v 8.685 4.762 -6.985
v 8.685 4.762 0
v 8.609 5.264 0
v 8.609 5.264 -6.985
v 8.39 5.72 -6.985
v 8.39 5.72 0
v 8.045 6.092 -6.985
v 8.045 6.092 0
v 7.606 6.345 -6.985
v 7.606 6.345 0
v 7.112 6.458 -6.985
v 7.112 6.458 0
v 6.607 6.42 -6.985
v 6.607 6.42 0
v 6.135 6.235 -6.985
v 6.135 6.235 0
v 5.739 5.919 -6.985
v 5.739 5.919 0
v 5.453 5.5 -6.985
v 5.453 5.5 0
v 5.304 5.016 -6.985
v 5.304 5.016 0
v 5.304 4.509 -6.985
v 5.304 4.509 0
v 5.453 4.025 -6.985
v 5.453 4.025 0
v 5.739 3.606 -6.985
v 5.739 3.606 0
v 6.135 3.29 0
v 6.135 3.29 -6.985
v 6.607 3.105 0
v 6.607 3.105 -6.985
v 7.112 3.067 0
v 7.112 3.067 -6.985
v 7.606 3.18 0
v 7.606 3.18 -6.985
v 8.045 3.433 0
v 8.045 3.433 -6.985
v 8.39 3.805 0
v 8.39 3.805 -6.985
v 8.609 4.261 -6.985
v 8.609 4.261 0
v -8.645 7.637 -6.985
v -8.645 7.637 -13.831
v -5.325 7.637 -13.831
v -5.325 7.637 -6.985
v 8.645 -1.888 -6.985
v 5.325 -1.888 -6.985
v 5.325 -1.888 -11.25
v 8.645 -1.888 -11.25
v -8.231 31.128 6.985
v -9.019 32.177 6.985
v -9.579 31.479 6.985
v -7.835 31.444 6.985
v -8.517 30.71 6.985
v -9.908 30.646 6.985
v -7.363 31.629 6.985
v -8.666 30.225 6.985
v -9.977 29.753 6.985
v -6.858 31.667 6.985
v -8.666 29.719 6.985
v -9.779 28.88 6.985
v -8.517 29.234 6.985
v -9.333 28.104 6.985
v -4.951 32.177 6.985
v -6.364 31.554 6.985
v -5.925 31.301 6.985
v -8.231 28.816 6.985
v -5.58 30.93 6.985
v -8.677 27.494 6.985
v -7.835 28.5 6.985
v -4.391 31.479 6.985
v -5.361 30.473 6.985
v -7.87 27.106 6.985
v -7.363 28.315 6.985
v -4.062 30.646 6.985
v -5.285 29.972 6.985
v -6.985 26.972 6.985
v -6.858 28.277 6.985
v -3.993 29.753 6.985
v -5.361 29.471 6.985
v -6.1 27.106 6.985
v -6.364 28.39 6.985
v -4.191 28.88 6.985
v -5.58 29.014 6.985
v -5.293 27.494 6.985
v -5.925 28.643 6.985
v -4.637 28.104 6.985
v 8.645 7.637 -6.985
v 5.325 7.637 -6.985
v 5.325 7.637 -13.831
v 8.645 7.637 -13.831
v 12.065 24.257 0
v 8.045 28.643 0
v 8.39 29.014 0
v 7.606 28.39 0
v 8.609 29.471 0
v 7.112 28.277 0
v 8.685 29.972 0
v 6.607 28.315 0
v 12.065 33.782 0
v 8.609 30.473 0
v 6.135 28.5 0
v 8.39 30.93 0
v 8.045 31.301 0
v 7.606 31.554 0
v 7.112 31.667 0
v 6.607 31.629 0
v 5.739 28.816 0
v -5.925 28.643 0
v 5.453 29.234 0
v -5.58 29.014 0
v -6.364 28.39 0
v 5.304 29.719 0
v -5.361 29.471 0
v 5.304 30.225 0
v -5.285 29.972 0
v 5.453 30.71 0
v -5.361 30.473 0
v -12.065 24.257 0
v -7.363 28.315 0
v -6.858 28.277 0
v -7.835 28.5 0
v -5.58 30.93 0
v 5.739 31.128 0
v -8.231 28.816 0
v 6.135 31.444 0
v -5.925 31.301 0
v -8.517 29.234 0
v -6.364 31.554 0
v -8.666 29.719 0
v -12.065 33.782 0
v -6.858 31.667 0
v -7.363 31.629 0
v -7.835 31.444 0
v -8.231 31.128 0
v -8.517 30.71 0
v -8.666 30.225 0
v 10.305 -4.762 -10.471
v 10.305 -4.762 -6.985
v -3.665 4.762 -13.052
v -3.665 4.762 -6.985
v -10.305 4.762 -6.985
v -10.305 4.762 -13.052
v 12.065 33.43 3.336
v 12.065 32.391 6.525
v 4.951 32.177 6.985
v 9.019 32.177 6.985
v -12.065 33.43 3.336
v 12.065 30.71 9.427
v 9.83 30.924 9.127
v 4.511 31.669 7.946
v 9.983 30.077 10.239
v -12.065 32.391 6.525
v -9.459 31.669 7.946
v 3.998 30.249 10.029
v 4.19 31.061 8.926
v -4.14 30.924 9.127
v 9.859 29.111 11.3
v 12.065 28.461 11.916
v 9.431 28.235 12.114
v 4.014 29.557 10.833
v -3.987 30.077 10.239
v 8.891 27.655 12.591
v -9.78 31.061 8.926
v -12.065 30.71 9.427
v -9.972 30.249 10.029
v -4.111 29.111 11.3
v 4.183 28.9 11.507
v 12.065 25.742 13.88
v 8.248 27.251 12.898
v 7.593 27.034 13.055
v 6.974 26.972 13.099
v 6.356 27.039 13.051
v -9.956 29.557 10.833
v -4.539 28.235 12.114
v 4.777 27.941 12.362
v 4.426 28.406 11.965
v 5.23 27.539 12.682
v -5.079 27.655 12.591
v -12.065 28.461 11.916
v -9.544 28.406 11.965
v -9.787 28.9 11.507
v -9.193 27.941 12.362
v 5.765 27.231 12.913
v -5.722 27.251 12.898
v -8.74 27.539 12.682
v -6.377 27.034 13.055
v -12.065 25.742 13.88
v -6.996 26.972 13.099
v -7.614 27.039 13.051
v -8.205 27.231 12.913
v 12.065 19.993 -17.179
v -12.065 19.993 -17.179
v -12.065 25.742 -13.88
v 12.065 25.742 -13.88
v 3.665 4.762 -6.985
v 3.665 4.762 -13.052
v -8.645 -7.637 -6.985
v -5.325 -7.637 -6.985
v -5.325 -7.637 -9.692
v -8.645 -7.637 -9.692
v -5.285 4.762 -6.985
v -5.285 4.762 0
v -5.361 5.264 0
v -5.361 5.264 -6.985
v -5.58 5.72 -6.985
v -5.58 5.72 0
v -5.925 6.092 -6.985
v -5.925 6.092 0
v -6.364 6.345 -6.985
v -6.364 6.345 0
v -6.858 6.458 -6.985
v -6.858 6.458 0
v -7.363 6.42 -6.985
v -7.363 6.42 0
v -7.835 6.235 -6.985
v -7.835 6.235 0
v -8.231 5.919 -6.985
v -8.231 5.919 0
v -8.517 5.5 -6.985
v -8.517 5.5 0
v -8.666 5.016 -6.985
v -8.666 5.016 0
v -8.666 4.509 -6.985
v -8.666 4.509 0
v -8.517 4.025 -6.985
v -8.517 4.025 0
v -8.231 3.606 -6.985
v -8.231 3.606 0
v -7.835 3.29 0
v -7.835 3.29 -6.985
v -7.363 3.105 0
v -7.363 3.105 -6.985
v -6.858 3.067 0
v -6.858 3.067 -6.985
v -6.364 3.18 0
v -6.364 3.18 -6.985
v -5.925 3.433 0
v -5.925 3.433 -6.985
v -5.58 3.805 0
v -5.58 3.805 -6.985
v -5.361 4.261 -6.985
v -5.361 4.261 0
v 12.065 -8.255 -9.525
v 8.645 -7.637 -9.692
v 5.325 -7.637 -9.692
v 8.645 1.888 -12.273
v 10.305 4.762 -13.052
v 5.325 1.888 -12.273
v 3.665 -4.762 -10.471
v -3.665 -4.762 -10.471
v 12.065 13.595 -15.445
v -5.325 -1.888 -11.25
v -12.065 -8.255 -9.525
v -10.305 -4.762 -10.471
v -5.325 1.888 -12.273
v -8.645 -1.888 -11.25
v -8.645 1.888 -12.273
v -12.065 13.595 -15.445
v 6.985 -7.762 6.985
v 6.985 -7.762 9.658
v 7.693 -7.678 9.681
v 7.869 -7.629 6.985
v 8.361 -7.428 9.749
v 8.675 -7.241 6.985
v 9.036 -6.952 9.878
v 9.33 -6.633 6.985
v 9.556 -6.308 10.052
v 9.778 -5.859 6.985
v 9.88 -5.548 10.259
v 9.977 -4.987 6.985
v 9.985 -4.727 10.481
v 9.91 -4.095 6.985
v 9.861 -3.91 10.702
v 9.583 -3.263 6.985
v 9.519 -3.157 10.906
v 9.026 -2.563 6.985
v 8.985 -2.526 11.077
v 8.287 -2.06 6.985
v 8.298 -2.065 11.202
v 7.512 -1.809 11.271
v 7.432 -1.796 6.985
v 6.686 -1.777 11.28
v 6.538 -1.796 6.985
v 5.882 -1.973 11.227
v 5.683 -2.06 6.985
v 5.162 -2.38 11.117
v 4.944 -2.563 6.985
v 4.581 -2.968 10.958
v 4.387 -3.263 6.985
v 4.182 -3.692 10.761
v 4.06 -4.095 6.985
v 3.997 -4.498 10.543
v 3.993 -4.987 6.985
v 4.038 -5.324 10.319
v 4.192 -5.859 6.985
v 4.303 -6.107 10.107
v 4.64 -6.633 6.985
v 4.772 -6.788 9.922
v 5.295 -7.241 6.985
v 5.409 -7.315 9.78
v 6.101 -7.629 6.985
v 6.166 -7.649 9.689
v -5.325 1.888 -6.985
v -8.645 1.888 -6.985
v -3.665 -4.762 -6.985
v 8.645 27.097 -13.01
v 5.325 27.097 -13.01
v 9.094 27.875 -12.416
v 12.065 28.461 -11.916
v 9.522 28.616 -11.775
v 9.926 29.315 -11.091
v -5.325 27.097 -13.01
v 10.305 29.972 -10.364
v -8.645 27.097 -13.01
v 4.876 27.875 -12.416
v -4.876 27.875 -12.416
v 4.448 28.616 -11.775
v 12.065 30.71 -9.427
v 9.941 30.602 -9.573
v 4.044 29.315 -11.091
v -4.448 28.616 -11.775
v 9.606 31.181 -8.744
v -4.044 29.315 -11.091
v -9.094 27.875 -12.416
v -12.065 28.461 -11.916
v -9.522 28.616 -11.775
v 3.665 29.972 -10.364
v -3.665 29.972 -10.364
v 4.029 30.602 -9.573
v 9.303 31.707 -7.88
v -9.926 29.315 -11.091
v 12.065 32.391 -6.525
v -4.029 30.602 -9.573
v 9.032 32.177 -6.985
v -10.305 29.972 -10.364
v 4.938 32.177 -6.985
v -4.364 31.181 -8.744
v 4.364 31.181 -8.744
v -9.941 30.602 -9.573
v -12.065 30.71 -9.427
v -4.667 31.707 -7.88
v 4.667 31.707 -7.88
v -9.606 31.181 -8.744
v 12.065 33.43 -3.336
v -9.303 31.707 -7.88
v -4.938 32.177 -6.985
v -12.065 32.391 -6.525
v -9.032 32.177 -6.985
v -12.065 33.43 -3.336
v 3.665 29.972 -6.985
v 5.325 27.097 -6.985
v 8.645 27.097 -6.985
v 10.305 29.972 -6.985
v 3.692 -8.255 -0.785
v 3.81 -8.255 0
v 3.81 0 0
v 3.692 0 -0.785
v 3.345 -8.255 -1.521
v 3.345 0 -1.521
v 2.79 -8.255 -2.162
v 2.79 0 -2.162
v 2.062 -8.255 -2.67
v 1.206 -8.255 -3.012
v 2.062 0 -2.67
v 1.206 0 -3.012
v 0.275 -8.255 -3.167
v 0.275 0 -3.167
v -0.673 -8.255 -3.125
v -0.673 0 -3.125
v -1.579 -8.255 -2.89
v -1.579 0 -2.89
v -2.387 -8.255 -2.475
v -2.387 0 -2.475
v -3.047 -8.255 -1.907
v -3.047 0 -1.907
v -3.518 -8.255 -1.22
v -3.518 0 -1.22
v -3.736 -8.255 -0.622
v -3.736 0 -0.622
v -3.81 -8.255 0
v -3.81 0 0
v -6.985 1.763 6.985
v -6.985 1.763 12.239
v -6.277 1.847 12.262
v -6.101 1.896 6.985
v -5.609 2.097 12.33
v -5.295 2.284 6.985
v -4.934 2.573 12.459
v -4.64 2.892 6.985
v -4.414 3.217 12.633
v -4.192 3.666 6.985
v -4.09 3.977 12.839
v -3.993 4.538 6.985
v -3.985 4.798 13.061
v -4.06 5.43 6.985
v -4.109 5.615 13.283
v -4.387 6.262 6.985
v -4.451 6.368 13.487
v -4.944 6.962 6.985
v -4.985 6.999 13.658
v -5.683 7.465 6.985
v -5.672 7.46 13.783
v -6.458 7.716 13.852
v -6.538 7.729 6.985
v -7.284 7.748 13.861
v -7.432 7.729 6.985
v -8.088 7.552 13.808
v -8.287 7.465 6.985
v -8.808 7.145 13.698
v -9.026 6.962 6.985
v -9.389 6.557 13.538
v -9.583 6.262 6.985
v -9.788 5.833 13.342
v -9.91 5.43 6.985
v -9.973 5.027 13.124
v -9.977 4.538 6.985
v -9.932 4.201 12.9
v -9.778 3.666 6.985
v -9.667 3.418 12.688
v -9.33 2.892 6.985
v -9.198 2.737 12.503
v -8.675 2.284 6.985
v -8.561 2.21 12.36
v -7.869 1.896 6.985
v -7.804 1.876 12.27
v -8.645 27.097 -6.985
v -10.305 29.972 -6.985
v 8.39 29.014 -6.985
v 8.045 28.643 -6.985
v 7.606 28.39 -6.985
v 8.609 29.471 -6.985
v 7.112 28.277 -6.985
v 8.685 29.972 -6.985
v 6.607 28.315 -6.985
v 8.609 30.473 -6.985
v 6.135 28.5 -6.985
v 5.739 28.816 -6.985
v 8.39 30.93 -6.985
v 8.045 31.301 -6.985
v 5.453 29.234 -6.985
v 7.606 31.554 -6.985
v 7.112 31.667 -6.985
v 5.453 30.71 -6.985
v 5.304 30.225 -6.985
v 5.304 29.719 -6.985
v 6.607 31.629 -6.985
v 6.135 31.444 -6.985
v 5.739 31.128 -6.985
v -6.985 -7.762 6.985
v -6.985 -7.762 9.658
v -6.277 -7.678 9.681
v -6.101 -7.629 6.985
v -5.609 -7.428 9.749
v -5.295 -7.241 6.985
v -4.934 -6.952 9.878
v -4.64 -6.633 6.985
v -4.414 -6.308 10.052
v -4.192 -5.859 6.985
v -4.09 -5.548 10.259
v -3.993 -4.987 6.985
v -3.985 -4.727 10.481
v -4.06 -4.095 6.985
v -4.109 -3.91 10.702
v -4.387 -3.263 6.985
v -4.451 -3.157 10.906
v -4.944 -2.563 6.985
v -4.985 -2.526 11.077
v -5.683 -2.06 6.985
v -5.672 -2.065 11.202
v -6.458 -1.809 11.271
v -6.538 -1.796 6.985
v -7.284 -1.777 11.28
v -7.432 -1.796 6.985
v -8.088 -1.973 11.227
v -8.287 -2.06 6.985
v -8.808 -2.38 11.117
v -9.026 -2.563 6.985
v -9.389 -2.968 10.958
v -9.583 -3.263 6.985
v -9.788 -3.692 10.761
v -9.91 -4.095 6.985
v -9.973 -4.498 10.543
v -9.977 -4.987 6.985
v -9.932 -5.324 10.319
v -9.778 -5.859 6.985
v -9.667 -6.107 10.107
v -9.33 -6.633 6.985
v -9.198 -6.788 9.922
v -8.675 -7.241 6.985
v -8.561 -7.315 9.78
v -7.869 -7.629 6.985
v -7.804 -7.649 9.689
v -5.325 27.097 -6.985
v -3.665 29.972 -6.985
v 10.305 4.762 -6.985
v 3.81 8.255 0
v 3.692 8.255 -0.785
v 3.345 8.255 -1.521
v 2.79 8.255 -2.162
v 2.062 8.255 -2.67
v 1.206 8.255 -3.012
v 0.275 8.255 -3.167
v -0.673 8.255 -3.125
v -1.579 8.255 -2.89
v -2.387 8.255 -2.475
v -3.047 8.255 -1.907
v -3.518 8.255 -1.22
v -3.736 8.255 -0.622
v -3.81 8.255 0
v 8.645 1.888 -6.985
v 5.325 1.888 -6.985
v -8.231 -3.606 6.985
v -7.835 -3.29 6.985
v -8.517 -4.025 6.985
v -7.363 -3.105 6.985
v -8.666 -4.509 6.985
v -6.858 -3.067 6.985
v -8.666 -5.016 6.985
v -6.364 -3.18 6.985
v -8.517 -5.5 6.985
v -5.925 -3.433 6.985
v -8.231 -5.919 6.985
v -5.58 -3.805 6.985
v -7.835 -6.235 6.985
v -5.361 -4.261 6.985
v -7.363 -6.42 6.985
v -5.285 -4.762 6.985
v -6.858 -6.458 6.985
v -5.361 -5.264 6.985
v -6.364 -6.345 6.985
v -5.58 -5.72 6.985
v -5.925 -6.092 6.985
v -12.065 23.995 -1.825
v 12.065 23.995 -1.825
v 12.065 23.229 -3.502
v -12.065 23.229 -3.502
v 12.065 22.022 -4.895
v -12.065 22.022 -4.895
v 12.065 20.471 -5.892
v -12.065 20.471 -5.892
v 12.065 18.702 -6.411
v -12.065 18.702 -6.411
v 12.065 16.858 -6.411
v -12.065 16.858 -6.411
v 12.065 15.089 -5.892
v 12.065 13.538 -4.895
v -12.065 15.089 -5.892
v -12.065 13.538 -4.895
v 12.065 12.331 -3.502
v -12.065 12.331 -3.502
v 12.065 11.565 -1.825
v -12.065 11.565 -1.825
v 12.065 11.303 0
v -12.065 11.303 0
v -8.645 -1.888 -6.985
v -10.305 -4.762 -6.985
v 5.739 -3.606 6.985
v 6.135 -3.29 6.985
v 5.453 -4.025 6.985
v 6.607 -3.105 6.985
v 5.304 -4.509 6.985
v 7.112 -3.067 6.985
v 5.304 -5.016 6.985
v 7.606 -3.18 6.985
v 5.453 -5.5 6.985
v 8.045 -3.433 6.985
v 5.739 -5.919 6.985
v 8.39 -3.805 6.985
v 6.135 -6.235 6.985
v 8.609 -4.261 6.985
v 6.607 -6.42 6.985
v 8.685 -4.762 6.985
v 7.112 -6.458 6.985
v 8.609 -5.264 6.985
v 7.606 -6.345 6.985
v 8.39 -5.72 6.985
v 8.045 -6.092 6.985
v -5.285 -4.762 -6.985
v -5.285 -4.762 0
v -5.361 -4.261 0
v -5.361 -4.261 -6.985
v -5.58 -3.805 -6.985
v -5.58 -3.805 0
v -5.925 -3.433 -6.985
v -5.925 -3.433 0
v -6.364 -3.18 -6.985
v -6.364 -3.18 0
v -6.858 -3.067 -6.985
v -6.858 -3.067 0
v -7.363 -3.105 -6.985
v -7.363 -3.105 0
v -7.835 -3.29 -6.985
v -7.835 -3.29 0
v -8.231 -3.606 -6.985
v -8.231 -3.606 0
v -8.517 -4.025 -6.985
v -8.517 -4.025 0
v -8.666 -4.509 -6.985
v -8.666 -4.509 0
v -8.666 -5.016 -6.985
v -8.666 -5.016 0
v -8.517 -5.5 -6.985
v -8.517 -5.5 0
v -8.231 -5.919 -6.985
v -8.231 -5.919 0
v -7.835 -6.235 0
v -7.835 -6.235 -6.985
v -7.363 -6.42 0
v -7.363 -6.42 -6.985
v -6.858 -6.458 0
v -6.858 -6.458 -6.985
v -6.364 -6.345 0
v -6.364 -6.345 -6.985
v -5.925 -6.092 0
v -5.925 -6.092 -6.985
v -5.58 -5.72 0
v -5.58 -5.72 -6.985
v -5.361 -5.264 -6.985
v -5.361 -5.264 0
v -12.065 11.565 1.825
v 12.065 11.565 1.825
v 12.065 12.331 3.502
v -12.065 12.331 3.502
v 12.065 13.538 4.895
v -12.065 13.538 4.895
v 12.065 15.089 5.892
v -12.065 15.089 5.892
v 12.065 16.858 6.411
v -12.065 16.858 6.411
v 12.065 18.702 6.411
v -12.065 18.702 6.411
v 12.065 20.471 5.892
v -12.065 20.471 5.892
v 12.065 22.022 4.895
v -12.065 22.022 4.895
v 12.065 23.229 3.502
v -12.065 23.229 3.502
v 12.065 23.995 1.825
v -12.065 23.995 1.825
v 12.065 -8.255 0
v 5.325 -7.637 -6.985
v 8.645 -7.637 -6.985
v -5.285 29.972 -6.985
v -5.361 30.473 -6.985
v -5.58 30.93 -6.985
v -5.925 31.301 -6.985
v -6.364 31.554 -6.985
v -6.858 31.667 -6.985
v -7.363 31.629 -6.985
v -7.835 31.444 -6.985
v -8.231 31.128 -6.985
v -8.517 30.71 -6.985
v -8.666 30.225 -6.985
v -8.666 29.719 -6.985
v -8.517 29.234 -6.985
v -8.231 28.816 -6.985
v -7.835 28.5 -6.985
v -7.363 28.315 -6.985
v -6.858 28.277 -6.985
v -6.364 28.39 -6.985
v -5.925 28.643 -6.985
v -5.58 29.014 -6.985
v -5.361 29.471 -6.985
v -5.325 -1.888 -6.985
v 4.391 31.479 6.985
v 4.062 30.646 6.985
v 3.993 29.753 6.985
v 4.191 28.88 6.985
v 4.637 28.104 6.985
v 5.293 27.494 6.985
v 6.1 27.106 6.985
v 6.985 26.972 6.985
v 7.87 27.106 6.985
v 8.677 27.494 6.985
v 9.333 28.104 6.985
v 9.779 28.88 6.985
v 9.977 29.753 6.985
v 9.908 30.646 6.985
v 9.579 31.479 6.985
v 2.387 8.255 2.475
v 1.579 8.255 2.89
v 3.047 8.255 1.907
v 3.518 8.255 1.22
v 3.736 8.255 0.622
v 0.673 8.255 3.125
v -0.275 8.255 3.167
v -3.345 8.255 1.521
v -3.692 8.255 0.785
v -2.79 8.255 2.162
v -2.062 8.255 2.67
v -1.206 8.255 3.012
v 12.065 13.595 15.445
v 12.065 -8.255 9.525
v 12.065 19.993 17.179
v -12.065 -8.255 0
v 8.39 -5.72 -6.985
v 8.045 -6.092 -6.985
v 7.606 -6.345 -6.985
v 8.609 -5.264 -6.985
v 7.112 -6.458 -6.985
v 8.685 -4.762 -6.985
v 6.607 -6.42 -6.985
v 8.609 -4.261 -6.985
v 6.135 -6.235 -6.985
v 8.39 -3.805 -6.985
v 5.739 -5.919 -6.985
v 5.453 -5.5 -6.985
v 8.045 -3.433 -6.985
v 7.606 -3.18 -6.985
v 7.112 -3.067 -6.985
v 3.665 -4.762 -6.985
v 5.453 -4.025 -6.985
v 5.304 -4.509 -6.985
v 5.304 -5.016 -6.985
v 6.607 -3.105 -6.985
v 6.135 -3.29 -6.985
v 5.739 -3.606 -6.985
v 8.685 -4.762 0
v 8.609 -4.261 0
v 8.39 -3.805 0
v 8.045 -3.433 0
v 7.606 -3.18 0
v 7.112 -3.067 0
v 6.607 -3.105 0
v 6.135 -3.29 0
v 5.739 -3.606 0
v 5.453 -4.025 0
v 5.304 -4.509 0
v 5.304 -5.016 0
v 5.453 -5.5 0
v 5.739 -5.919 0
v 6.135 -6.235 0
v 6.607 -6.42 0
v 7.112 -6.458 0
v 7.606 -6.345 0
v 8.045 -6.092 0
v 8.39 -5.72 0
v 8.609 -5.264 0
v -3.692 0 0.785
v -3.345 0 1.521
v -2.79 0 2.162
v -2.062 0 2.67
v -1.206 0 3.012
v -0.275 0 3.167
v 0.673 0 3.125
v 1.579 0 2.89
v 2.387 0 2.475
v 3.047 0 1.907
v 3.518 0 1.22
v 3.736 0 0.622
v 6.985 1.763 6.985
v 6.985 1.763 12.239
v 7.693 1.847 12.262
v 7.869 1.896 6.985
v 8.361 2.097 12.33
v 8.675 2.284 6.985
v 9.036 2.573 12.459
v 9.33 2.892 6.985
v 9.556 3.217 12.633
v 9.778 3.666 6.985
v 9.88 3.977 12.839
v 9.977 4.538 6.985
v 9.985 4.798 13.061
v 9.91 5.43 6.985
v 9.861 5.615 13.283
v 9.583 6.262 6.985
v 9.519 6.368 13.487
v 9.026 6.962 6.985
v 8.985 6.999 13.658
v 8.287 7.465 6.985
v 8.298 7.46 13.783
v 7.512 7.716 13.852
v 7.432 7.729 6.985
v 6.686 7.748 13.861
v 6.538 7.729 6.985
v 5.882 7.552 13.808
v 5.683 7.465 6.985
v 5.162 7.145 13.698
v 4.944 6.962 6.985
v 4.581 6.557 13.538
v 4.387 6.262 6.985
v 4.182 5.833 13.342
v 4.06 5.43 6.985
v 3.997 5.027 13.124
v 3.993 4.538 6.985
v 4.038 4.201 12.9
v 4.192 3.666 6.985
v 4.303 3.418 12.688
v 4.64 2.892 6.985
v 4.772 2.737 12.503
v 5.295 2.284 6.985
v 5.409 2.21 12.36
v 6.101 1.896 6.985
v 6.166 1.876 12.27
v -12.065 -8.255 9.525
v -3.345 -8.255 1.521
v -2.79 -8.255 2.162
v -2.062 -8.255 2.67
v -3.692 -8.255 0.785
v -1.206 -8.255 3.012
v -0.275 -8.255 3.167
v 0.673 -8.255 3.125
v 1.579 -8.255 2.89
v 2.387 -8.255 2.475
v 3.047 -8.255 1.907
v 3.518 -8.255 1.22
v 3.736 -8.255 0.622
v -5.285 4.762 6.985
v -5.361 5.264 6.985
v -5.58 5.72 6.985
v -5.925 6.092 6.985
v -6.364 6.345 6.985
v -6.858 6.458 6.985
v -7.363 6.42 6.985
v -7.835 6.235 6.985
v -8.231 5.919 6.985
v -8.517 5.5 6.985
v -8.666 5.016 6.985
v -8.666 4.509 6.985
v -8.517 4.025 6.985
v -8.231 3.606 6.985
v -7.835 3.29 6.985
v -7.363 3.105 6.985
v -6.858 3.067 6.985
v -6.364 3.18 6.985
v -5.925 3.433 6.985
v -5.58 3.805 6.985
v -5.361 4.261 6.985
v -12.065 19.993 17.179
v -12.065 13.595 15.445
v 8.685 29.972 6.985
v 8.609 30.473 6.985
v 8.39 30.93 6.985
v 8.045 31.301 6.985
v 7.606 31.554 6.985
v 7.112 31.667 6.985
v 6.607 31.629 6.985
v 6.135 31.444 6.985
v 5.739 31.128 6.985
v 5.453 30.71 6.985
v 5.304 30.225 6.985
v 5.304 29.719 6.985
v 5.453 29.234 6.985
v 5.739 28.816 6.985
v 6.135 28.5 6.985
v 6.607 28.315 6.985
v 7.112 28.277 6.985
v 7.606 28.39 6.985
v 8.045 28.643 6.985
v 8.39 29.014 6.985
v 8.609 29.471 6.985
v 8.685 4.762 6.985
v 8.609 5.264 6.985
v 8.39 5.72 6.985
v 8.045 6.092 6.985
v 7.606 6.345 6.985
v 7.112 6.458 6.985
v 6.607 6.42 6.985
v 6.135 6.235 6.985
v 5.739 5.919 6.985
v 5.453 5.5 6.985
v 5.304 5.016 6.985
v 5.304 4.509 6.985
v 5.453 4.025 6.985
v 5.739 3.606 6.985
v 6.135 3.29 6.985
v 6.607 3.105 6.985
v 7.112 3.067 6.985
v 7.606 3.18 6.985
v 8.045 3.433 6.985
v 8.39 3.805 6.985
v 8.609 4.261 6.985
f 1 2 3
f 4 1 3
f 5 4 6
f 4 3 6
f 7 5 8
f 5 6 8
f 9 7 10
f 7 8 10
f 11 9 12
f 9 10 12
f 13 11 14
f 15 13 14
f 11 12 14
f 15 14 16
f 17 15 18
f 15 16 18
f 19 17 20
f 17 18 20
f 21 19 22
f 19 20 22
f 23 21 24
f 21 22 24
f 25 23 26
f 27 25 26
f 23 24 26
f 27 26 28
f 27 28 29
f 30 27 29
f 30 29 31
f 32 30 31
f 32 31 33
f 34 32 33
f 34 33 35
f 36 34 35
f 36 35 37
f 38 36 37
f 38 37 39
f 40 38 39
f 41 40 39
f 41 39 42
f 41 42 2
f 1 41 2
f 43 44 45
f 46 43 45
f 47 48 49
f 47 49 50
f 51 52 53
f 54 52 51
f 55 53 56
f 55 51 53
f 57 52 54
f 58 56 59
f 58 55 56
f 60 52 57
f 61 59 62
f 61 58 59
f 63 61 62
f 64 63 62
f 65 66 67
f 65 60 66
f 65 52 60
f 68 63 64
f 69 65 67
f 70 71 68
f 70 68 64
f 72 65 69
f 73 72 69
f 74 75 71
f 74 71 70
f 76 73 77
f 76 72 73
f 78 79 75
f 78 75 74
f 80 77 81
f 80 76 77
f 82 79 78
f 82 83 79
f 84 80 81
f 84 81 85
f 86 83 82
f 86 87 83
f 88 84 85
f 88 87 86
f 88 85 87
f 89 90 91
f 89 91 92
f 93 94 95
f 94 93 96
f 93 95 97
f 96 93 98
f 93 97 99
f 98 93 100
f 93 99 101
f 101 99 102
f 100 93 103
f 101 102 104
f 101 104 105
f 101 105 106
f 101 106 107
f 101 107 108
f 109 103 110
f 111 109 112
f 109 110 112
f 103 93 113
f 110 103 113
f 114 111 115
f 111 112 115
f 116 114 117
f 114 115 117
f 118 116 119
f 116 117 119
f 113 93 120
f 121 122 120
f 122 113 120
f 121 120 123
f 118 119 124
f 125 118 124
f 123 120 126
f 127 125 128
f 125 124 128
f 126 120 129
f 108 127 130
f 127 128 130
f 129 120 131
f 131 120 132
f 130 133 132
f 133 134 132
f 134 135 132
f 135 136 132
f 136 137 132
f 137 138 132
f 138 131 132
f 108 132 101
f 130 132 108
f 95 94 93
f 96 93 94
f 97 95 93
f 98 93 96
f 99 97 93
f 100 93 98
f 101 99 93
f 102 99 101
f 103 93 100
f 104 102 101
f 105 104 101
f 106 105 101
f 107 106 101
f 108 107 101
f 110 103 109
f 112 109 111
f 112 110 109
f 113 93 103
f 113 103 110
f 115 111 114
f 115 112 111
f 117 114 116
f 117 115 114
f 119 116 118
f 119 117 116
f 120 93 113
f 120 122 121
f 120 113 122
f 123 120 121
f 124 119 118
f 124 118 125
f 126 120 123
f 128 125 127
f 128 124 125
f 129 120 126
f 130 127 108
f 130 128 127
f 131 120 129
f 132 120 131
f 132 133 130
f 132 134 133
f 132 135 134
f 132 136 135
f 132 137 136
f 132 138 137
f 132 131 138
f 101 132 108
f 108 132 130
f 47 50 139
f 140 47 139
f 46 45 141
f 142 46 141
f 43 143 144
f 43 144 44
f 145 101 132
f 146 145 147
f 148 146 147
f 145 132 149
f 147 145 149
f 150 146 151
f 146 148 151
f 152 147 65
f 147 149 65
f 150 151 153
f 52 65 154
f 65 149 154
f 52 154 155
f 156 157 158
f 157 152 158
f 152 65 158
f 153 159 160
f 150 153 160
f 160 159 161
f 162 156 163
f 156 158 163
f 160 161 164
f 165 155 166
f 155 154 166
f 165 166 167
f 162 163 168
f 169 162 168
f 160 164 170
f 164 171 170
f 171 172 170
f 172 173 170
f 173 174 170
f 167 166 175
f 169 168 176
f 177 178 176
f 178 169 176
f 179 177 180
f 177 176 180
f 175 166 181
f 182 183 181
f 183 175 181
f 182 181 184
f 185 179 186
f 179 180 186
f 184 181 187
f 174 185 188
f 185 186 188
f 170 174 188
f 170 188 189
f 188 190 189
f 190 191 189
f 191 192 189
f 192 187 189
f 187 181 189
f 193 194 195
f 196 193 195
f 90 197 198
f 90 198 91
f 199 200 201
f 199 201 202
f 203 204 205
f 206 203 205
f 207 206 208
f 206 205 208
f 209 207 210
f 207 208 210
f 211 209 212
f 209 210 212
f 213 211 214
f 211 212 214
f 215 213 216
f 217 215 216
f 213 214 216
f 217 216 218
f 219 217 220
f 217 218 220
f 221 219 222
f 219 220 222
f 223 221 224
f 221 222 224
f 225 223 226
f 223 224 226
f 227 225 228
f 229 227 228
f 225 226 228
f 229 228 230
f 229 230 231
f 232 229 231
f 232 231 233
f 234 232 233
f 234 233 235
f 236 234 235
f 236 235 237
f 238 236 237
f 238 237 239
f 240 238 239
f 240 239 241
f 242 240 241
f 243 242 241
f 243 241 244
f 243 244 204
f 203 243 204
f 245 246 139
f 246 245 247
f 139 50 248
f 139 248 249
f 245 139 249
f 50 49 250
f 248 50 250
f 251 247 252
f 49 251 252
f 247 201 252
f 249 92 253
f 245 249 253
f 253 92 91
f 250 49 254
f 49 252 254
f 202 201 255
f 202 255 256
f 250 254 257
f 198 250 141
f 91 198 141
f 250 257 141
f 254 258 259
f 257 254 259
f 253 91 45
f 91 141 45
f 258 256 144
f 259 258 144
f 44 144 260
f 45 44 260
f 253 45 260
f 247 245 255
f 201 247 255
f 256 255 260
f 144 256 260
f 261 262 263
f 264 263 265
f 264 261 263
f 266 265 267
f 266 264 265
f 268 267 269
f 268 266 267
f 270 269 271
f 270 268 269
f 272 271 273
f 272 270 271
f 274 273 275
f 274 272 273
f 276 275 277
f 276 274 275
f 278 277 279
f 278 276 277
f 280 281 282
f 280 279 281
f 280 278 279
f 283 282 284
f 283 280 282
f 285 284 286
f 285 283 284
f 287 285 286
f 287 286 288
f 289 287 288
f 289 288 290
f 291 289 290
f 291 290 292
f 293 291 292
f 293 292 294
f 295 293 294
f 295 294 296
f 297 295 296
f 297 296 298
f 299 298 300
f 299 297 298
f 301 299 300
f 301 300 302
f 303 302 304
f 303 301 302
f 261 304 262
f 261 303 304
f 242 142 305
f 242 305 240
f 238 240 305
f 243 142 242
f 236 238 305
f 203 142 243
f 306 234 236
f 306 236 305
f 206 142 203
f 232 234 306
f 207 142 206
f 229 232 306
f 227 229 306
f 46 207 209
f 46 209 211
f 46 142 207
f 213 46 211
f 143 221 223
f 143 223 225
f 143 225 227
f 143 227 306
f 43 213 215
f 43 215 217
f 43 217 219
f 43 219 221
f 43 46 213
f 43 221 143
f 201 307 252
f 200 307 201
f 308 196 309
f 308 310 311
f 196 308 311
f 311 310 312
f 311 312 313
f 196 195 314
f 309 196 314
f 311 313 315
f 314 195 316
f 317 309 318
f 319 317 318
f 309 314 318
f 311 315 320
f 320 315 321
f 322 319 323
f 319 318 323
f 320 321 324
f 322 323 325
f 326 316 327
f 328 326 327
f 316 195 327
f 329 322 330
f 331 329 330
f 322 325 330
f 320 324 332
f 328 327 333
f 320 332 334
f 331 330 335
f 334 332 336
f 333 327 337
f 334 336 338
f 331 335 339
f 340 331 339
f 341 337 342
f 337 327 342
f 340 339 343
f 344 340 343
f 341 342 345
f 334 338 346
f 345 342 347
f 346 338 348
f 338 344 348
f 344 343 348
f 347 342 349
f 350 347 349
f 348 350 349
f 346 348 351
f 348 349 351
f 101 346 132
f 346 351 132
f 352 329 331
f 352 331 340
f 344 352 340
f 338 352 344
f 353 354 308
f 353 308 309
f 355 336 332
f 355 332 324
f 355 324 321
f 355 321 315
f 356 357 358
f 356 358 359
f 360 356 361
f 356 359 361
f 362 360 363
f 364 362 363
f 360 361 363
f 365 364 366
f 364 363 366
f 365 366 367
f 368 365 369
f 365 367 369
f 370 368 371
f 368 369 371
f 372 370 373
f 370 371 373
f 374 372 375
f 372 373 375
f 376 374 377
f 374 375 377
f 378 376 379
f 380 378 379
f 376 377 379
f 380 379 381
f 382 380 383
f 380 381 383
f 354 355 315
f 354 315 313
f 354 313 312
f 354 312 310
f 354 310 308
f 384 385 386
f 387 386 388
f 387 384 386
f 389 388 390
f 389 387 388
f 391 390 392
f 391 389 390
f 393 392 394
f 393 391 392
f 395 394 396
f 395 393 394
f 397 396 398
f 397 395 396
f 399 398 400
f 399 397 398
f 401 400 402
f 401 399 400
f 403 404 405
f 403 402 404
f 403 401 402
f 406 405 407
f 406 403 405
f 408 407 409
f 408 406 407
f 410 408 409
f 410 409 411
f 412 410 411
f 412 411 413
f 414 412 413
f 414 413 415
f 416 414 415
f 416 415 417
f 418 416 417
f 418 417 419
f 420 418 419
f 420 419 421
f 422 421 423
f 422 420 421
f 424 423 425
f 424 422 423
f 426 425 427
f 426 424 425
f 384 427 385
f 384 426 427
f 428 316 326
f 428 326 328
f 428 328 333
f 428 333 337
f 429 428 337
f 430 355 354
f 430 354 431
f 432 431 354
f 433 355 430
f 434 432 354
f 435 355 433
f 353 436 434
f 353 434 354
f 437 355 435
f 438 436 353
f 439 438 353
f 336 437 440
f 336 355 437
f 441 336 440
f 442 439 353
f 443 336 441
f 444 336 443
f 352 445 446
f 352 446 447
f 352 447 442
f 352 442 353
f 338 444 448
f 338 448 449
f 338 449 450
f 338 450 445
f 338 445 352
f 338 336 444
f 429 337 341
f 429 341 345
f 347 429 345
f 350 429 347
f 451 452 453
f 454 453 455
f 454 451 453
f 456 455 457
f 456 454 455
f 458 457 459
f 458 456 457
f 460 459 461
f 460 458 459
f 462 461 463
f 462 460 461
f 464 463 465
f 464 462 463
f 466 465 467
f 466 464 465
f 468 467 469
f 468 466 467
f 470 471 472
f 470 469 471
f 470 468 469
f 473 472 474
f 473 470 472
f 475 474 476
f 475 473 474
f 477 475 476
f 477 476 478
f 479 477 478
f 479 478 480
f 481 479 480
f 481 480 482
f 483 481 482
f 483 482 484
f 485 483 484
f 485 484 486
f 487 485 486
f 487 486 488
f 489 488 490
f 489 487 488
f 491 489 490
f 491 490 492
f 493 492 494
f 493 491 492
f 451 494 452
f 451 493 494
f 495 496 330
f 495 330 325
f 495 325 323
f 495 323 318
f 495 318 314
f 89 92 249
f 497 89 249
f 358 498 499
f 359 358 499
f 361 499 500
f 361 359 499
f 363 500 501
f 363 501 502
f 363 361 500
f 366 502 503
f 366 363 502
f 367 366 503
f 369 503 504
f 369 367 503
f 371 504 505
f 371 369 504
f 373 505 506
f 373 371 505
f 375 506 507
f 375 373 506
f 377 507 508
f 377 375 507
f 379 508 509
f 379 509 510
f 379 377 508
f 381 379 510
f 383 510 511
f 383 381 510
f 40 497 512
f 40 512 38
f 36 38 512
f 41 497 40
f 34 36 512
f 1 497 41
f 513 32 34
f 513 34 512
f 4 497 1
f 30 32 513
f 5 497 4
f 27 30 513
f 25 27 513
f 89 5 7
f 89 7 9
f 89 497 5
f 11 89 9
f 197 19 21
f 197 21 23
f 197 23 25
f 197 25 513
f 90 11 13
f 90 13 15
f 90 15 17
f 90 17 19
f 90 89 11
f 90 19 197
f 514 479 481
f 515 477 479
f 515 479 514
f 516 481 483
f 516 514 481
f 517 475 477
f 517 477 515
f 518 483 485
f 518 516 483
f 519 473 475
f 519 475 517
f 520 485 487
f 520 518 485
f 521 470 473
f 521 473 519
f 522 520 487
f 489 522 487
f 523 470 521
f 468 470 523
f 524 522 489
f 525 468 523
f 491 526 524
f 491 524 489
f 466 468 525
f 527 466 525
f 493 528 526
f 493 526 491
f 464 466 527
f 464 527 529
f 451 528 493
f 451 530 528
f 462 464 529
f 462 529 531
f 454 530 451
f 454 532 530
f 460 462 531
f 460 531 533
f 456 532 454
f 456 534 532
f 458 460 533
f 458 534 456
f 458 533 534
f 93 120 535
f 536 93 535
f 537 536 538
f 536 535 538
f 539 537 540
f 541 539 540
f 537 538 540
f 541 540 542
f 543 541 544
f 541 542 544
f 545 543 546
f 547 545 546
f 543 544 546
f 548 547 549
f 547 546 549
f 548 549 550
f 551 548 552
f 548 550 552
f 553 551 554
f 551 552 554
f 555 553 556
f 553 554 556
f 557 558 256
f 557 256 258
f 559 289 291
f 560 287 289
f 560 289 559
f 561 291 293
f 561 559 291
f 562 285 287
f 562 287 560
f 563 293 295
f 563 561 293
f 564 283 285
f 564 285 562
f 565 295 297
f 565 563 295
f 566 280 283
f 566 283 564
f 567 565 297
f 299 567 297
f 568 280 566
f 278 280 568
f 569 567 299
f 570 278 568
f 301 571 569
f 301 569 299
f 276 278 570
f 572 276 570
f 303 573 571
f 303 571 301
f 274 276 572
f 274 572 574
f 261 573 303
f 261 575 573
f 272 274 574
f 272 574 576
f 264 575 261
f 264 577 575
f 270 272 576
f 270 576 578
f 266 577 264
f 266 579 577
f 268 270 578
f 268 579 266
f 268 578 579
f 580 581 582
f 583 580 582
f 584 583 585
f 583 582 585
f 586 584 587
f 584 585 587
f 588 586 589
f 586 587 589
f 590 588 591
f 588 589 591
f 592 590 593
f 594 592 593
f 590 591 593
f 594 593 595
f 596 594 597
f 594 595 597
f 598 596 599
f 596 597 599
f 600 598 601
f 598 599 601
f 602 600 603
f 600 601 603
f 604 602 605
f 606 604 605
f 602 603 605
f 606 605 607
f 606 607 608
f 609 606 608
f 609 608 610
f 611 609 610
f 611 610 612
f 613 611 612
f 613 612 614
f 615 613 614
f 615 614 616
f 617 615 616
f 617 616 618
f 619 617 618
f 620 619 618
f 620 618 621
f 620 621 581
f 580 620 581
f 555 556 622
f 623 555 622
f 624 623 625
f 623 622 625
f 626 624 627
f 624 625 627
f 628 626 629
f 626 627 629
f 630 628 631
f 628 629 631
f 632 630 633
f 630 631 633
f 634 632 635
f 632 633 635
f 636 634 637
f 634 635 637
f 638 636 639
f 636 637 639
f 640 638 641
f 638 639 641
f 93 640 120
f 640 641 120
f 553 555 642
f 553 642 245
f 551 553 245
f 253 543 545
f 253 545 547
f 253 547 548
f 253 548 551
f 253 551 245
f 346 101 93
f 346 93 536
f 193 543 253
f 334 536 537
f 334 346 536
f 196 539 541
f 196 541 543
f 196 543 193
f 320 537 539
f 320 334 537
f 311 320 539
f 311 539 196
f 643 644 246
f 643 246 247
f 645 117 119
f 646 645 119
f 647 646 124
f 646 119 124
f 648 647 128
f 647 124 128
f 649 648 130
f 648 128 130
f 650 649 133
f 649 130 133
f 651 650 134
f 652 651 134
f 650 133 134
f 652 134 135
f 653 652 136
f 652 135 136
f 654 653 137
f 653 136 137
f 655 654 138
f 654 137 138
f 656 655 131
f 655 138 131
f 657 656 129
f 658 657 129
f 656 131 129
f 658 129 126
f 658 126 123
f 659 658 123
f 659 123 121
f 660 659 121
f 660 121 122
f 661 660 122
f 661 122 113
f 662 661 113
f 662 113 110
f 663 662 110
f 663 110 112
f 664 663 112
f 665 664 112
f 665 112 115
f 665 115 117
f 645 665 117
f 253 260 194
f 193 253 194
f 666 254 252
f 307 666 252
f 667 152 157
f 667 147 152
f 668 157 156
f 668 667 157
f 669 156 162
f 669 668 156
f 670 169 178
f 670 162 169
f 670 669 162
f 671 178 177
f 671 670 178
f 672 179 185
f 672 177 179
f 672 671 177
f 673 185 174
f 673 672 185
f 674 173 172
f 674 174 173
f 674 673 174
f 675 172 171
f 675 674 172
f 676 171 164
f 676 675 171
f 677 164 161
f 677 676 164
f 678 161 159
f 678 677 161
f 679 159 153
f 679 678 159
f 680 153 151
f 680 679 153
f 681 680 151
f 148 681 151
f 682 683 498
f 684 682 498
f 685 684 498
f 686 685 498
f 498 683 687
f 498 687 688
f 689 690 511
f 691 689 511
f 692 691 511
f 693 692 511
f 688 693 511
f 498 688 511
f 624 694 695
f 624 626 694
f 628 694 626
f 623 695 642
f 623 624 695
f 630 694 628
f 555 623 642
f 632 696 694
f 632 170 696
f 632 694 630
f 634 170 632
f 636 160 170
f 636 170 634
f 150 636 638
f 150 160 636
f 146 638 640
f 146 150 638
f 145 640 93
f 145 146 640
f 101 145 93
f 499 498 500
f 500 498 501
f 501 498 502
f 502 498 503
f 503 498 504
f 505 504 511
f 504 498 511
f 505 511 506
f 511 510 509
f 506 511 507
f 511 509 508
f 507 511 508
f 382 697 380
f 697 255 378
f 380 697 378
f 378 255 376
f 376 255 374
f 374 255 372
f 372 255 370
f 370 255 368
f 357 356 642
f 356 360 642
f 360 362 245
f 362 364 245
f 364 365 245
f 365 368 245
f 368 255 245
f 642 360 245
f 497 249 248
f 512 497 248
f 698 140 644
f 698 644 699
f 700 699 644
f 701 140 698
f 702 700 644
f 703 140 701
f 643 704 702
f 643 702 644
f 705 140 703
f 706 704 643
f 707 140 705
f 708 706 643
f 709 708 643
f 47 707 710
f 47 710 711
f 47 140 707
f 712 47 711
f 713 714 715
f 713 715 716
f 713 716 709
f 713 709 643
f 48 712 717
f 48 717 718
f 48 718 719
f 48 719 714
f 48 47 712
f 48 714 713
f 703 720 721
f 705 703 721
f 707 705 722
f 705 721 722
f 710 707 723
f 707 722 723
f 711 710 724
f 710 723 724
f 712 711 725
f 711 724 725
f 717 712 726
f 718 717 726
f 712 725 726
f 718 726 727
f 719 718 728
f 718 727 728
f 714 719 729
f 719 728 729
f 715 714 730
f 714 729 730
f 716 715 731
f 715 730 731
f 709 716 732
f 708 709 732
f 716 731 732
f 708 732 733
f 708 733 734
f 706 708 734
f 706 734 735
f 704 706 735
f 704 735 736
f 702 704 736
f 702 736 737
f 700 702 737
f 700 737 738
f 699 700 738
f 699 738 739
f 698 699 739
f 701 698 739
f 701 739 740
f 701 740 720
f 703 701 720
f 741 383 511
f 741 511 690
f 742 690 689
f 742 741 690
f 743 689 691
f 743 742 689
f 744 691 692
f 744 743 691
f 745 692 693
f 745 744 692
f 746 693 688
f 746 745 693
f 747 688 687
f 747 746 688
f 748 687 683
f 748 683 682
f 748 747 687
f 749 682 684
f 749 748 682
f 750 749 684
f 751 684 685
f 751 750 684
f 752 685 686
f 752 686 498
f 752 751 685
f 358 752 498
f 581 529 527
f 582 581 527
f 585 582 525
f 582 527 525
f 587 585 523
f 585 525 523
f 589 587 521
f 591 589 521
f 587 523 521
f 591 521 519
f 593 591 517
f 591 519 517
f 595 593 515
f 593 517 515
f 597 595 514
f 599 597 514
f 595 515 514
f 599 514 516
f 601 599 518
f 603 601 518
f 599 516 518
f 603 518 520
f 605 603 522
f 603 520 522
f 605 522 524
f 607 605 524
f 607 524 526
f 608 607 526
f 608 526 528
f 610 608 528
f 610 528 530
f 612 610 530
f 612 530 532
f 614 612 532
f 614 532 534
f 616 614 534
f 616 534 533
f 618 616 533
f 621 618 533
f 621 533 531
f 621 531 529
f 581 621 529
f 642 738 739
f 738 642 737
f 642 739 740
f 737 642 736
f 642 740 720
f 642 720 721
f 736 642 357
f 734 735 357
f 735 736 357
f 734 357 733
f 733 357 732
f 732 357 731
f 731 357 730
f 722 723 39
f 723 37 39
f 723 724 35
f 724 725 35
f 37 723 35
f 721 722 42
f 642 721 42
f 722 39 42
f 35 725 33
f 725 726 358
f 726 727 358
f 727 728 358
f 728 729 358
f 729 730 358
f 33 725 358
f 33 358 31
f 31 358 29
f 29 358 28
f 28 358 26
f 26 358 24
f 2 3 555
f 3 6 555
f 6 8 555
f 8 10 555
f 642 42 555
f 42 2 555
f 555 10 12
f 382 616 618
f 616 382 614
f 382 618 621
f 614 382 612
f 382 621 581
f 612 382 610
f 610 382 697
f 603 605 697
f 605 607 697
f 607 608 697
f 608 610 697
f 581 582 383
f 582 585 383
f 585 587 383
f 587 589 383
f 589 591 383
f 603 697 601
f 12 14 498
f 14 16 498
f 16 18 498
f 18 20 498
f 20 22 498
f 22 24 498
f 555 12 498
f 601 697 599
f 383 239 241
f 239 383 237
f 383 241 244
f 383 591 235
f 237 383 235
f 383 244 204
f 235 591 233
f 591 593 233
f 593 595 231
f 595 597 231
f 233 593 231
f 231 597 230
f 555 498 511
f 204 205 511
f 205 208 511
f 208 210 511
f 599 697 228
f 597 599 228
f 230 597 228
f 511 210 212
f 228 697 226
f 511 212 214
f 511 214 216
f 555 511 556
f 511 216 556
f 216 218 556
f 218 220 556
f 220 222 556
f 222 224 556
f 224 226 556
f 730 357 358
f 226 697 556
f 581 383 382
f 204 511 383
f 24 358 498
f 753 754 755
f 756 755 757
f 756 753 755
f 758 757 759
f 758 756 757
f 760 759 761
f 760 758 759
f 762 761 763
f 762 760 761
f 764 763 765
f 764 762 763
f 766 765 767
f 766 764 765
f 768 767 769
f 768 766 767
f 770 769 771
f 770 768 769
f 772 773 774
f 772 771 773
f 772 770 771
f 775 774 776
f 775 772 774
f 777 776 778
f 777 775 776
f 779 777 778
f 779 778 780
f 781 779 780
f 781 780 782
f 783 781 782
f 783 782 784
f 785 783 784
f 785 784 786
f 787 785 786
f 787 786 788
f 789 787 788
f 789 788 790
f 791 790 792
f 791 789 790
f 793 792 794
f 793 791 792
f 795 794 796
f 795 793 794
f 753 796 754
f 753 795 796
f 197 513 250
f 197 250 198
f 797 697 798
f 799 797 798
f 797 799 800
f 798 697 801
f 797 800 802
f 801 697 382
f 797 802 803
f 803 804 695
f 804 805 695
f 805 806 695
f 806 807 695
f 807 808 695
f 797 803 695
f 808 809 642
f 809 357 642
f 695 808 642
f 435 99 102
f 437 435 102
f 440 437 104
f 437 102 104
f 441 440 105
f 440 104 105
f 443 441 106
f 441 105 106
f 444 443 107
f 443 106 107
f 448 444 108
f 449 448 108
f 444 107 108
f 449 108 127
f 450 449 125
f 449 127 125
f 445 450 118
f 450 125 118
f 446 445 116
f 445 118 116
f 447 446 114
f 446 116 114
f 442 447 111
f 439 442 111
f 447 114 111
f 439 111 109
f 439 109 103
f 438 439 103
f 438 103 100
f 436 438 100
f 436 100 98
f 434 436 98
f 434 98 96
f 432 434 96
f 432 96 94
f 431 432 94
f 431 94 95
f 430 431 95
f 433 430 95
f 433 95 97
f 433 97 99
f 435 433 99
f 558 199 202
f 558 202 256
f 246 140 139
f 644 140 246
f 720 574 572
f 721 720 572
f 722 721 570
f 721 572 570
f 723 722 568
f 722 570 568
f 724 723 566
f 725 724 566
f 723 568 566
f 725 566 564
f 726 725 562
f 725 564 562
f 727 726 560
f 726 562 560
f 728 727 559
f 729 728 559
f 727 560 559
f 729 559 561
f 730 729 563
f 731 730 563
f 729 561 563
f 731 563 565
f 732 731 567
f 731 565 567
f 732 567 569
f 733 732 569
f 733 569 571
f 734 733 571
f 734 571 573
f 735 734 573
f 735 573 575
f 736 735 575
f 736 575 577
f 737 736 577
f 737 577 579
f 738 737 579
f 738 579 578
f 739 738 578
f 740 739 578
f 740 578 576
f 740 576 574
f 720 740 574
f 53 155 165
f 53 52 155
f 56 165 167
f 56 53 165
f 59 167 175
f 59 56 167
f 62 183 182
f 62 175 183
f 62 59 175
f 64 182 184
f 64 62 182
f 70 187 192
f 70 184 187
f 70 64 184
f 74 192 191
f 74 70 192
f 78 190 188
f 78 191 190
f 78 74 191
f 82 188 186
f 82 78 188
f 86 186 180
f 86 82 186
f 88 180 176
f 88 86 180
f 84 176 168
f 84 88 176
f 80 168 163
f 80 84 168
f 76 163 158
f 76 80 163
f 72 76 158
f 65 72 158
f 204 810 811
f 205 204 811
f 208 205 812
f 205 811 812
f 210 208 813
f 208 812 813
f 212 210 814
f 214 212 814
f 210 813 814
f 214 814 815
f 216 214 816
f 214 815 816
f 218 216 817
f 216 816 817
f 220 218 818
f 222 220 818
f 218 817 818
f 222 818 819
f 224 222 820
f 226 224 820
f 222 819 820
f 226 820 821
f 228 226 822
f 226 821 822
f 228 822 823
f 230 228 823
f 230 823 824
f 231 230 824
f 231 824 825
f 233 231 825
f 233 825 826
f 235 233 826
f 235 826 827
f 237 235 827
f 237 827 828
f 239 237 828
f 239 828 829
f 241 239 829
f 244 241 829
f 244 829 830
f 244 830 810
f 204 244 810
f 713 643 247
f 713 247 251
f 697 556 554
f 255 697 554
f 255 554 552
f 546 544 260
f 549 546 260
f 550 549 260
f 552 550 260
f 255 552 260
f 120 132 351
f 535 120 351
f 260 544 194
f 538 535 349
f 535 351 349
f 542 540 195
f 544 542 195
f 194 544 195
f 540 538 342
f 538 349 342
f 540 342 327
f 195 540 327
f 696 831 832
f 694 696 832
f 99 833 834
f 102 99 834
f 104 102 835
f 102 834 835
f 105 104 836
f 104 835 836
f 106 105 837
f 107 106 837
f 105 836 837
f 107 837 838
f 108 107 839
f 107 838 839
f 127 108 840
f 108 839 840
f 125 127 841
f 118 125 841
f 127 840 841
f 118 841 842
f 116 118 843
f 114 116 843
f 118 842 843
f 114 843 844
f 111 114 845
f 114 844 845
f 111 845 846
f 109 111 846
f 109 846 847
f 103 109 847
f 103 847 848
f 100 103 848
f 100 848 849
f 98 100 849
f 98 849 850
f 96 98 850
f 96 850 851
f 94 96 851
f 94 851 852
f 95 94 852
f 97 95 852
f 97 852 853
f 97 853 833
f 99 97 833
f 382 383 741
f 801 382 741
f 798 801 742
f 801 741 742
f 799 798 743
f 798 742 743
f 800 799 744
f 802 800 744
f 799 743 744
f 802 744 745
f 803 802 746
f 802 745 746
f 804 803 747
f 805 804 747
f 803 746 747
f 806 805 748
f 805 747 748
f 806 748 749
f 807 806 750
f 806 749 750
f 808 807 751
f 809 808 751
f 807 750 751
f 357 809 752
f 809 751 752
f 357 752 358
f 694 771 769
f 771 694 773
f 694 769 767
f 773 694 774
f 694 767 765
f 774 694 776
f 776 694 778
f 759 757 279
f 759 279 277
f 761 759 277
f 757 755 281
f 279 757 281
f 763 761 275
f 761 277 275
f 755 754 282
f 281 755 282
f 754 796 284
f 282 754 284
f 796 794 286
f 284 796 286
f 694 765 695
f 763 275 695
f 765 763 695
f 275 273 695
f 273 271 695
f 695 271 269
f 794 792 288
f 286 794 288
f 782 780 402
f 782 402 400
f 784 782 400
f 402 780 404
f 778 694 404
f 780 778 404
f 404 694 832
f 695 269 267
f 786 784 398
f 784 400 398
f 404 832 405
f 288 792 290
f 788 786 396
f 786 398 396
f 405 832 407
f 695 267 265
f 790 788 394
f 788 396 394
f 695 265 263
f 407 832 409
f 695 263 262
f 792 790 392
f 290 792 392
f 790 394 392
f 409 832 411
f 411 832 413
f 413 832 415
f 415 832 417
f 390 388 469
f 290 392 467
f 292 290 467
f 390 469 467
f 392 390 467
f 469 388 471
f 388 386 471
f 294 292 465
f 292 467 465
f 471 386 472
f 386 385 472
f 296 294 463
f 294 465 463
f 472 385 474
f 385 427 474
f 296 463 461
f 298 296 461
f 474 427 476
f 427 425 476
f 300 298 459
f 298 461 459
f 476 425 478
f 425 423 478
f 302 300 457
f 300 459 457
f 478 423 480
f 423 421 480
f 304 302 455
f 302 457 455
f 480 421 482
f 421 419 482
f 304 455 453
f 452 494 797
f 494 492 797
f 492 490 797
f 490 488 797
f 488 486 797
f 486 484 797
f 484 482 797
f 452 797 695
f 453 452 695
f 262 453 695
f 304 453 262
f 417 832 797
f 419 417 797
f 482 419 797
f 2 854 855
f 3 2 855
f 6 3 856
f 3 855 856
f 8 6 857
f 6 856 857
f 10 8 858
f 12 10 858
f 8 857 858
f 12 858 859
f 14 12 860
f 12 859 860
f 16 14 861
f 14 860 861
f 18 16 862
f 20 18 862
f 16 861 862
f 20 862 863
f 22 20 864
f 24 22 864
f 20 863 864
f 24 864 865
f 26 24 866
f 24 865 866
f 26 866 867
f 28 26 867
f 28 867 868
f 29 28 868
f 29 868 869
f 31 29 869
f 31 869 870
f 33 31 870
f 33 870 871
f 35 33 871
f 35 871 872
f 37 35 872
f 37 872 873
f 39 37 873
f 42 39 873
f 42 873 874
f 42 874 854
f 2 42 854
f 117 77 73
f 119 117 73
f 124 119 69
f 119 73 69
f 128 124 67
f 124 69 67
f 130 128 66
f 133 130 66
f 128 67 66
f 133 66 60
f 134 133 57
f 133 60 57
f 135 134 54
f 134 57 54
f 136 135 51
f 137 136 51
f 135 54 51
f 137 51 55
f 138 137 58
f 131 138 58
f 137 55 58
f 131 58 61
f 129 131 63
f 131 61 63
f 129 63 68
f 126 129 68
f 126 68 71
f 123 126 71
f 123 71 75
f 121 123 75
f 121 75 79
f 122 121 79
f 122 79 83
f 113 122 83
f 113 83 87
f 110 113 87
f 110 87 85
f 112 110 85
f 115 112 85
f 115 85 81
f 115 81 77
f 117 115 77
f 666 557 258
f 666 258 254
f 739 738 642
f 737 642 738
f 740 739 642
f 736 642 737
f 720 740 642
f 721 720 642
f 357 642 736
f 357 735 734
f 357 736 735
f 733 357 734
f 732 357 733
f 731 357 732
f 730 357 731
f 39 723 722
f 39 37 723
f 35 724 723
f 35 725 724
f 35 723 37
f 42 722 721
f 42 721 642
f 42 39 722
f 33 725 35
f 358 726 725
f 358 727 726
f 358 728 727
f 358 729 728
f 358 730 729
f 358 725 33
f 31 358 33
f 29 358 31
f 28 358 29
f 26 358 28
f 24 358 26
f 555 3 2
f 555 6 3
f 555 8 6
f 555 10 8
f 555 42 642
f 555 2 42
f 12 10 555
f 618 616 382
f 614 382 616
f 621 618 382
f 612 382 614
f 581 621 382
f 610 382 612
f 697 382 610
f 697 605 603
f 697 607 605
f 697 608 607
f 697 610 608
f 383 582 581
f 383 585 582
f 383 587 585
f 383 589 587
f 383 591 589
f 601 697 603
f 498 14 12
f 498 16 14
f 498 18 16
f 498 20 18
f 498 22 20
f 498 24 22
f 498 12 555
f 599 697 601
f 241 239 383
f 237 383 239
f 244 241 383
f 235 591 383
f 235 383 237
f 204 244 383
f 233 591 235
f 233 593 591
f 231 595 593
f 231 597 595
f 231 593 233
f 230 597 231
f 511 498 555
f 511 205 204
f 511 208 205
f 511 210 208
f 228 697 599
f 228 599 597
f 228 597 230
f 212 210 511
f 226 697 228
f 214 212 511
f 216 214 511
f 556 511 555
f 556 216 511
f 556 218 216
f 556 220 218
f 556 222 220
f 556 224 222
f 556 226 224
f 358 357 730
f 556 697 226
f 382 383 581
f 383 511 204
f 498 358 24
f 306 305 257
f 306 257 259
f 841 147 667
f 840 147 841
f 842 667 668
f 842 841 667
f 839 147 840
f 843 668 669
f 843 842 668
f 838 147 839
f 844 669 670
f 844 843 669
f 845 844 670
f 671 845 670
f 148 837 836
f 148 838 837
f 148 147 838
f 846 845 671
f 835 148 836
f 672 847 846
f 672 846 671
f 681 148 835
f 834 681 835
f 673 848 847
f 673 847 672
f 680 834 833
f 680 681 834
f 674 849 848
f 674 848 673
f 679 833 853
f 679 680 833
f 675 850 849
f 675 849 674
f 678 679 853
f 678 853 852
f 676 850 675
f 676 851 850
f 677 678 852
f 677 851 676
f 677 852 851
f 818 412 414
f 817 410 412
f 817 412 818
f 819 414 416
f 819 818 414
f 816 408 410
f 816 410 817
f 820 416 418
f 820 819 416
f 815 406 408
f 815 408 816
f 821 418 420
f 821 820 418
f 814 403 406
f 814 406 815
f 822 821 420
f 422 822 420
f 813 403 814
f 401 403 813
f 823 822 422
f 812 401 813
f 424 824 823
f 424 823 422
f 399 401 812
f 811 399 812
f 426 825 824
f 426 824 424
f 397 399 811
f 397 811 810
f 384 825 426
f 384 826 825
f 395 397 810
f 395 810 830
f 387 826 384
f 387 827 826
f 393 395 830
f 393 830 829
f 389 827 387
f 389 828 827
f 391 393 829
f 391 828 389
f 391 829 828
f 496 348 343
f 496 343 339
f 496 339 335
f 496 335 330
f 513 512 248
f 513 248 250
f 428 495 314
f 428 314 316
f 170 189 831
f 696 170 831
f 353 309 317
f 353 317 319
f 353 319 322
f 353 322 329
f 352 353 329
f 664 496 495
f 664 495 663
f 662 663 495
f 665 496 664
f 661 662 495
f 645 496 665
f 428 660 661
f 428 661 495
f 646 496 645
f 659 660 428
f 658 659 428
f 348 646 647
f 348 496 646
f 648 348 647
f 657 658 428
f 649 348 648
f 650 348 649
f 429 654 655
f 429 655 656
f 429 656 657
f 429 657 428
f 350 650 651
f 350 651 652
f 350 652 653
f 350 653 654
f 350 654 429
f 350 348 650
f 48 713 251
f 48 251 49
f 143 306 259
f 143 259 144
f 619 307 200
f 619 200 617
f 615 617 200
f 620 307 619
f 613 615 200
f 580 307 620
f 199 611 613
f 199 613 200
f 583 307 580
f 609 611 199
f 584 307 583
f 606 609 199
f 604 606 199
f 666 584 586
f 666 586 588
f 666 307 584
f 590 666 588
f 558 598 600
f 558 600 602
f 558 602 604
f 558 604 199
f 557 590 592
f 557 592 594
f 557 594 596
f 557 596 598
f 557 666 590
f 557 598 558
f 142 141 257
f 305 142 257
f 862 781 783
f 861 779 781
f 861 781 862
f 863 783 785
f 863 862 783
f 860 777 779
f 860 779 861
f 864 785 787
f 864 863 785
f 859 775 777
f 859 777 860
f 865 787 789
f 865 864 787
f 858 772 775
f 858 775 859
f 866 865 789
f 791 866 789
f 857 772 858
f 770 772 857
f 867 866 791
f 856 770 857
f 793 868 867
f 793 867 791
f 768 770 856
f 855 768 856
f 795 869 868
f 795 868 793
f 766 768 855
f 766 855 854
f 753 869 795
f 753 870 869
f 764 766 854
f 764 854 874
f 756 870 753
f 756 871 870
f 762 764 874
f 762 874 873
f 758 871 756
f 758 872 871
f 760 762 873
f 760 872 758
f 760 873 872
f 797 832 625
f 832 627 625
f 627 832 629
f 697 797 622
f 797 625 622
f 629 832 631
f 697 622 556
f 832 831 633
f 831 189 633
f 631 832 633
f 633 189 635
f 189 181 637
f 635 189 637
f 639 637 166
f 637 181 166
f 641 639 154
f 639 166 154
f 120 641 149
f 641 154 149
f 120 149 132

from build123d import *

# Parameters (mm, degrees)
SKETCH1_W              = 24.13
SKETCH1_H              = 19.05
SKETCH1_RX             = 3.81
SKETCH1_RY             = 3.175
BOSS_EXTRUDE1_DEPTH    = 8.255
SKETCH18_R             = 6.477
BOSS_EXTRUDE6_DEPTH    = 24.13
SKETCH4_R              = 1.7
CUT_EXTRUDE1_DEPTH     = 45.719846392
CUT_EXTRUDE4_START     = -2.54
SKETCH13_R             = 2.999999969
CUT_EXTRUDE4_DEPTH     = 48.259846392
CUT_EXTRUDE6_START     = -2.54
CUT_EXTRUDE6_DEPTH     = 48.259846392
SPLIT1_SURFACE_1_BACK  = 60.412
SPLIT1_SURFACE_1_DEPTH = 120.824
SPLIT1_SURFACE_2_BACK  = 60.412
SPLIT1_SURFACE_2_DEPTH = 120.824


with BuildPart() as part:
    # Sketch1 → Boss-Extrude1 (new, symmetric)
    with BuildSketch(Plane(origin=(0, 0, 0), x_dir=(1, 0, 0), z_dir=(0, 1, 0))):
        Rectangle(SKETCH1_W, SKETCH1_H)
        with Locations(Location((0, 0), (0, 0, 180))):
            Ellipse(SKETCH1_RX, SKETCH1_RY, mode=Mode.SUBTRACT)
    extrude(amount=BOSS_EXTRUDE1_DEPTH, both=True)

    # Sketch18 → Boss-Extrude6 (add)
    with BuildSketch(Plane.ZY.offset(12.065)):
        with BuildLine():
            Line((15.445133453, 13.595282971), (9.525, -8.255))
            Line((9.525, -8.255), (9.525, 8.255))
            Line((9.525, 8.255), (-9.525, 8.255))
            Line((-9.525, 8.255), (-9.525, -8.255))
            Line((-9.525, -8.255), (-15.445133453, 13.595282971))
            Line((-15.445133453, 13.595282971), (-17.178500001, 19.99286672))
            Line((-17.178500001, 19.99286672), (-13.88040039, 25.742316812))
            ThreePointArc((-13.88040039, 25.742316812), (0, 33.782), (13.88040039, 25.742316812))
            Line((13.88040039, 25.742316812), (17.178500001, 19.99286672))
            Line((17.178500001, 19.99286672), (15.445133453, 13.595282971))
        make_face()
        with Locations((0, 17.78)):
            Circle(SKETCH18_R, mode=Mode.SUBTRACT)
    extrude(amount=-BOSS_EXTRUDE6_DEPTH)

    # Sketch4 → Cut-Extrude1 (cut, through all)
    with BuildSketch(Plane.XY.offset(9.525)):
        with Locations((-6.985, 4.7625)):
            Circle(SKETCH4_R)
    cut_extrude1 = extrude(amount=-CUT_EXTRUDE1_DEPTH, mode=Mode.SUBTRACT)

    # Sketch13 → Cut-Extrude4 (cut)
    with BuildSketch(Plane.XY.offset(9.525).offset(CUT_EXTRUDE4_START)):
        with Locations(Location((-6.985, 4.7625, 0), (0, 0, 270))):
            Circle(SKETCH13_R)
    cut_extrude4 = extrude(amount=CUT_EXTRUDE4_DEPTH, mode=Mode.SUBTRACT)

    # Sketch19 → Cut-Extrude6 (cut)
    with BuildSketch(Plane(origin=(0, 0, -9.525), x_dir=(-1, 0, 0), z_dir=(0, 0, -1)).offset(CUT_EXTRUDE6_START)):
        Polygon((10.304764007, 4.7625), (8.644882004, 7.637499965), (5.325117996, 7.637499965), (3.665235993, 4.7625), (5.325117996, 1.887500035), (8.644882004, 1.887500035), align=None)
    cut_extrude6 = extrude(amount=CUT_EXTRUDE6_DEPTH, mode=Mode.SUBTRACT)

    # Sketch-Pattern1: Cut-Extrude1, Cut-Extrude4, Cut-Extrude6 at 5 more places
    with Locations((0, -9.525, 0), (13.97, 0, 0), (13.97, -9.525, 0), (13.97, 25.2095, 0), (0, 25.2095, 0)):
        add(cut_extrude1, mode=Mode.SUBTRACT)
        add(cut_extrude4, mode=Mode.SUBTRACT)
        add(cut_extrude6, mode=Mode.SUBTRACT)


with BuildPart() as body_2:
    # Split1: the piece behind the surface
    add(part.part)
    # Split1 surface: a surface, the sketch's curves swept straight by 120.824 mm
    with BuildLine(Plane(origin=(12.065, 0, 0), x_dir=(0, 0, -1), z_dir=(1, 0, 0)).offset(-SPLIT1_SURFACE_1_BACK), mode=Mode.PRIVATE) as split1_surface_1_path:
        Line((0, -8.255), (0, 33.782))
    split1_surface_1 = Shell.extrude(split1_surface_1_path.wire(), (1 * SPLIT1_SURFACE_1_DEPTH, 0 * SPLIT1_SURFACE_1_DEPTH, 0 * SPLIT1_SURFACE_1_DEPTH))
    split(bisect_by=split1_surface_1, keep=Keep.BOTTOM)


with BuildPart() as part_1:
    add(part.part)

    # Split1: split by a surface, the side it looks to stays
    # Split1 surface: a surface, the sketch's curves swept straight by 120.824 mm
    with BuildLine(Plane(origin=(12.065, 0, 0), x_dir=(0, 0, -1), z_dir=(1, 0, 0)).offset(-SPLIT1_SURFACE_2_BACK), mode=Mode.PRIVATE) as split1_surface_2_path:
        Line((0, -8.255), (0, 33.782))
    split1_surface_2 = Shell.extrude(split1_surface_2_path.wire(), (1 * SPLIT1_SURFACE_2_DEPTH, 0 * SPLIT1_SURFACE_2_DEPTH, 0 * SPLIT1_SURFACE_2_DEPTH))
    split(bisect_by=split1_surface_2, keep=Keep.TOP)


solid = Compound([body_2.part, part_1.part])
